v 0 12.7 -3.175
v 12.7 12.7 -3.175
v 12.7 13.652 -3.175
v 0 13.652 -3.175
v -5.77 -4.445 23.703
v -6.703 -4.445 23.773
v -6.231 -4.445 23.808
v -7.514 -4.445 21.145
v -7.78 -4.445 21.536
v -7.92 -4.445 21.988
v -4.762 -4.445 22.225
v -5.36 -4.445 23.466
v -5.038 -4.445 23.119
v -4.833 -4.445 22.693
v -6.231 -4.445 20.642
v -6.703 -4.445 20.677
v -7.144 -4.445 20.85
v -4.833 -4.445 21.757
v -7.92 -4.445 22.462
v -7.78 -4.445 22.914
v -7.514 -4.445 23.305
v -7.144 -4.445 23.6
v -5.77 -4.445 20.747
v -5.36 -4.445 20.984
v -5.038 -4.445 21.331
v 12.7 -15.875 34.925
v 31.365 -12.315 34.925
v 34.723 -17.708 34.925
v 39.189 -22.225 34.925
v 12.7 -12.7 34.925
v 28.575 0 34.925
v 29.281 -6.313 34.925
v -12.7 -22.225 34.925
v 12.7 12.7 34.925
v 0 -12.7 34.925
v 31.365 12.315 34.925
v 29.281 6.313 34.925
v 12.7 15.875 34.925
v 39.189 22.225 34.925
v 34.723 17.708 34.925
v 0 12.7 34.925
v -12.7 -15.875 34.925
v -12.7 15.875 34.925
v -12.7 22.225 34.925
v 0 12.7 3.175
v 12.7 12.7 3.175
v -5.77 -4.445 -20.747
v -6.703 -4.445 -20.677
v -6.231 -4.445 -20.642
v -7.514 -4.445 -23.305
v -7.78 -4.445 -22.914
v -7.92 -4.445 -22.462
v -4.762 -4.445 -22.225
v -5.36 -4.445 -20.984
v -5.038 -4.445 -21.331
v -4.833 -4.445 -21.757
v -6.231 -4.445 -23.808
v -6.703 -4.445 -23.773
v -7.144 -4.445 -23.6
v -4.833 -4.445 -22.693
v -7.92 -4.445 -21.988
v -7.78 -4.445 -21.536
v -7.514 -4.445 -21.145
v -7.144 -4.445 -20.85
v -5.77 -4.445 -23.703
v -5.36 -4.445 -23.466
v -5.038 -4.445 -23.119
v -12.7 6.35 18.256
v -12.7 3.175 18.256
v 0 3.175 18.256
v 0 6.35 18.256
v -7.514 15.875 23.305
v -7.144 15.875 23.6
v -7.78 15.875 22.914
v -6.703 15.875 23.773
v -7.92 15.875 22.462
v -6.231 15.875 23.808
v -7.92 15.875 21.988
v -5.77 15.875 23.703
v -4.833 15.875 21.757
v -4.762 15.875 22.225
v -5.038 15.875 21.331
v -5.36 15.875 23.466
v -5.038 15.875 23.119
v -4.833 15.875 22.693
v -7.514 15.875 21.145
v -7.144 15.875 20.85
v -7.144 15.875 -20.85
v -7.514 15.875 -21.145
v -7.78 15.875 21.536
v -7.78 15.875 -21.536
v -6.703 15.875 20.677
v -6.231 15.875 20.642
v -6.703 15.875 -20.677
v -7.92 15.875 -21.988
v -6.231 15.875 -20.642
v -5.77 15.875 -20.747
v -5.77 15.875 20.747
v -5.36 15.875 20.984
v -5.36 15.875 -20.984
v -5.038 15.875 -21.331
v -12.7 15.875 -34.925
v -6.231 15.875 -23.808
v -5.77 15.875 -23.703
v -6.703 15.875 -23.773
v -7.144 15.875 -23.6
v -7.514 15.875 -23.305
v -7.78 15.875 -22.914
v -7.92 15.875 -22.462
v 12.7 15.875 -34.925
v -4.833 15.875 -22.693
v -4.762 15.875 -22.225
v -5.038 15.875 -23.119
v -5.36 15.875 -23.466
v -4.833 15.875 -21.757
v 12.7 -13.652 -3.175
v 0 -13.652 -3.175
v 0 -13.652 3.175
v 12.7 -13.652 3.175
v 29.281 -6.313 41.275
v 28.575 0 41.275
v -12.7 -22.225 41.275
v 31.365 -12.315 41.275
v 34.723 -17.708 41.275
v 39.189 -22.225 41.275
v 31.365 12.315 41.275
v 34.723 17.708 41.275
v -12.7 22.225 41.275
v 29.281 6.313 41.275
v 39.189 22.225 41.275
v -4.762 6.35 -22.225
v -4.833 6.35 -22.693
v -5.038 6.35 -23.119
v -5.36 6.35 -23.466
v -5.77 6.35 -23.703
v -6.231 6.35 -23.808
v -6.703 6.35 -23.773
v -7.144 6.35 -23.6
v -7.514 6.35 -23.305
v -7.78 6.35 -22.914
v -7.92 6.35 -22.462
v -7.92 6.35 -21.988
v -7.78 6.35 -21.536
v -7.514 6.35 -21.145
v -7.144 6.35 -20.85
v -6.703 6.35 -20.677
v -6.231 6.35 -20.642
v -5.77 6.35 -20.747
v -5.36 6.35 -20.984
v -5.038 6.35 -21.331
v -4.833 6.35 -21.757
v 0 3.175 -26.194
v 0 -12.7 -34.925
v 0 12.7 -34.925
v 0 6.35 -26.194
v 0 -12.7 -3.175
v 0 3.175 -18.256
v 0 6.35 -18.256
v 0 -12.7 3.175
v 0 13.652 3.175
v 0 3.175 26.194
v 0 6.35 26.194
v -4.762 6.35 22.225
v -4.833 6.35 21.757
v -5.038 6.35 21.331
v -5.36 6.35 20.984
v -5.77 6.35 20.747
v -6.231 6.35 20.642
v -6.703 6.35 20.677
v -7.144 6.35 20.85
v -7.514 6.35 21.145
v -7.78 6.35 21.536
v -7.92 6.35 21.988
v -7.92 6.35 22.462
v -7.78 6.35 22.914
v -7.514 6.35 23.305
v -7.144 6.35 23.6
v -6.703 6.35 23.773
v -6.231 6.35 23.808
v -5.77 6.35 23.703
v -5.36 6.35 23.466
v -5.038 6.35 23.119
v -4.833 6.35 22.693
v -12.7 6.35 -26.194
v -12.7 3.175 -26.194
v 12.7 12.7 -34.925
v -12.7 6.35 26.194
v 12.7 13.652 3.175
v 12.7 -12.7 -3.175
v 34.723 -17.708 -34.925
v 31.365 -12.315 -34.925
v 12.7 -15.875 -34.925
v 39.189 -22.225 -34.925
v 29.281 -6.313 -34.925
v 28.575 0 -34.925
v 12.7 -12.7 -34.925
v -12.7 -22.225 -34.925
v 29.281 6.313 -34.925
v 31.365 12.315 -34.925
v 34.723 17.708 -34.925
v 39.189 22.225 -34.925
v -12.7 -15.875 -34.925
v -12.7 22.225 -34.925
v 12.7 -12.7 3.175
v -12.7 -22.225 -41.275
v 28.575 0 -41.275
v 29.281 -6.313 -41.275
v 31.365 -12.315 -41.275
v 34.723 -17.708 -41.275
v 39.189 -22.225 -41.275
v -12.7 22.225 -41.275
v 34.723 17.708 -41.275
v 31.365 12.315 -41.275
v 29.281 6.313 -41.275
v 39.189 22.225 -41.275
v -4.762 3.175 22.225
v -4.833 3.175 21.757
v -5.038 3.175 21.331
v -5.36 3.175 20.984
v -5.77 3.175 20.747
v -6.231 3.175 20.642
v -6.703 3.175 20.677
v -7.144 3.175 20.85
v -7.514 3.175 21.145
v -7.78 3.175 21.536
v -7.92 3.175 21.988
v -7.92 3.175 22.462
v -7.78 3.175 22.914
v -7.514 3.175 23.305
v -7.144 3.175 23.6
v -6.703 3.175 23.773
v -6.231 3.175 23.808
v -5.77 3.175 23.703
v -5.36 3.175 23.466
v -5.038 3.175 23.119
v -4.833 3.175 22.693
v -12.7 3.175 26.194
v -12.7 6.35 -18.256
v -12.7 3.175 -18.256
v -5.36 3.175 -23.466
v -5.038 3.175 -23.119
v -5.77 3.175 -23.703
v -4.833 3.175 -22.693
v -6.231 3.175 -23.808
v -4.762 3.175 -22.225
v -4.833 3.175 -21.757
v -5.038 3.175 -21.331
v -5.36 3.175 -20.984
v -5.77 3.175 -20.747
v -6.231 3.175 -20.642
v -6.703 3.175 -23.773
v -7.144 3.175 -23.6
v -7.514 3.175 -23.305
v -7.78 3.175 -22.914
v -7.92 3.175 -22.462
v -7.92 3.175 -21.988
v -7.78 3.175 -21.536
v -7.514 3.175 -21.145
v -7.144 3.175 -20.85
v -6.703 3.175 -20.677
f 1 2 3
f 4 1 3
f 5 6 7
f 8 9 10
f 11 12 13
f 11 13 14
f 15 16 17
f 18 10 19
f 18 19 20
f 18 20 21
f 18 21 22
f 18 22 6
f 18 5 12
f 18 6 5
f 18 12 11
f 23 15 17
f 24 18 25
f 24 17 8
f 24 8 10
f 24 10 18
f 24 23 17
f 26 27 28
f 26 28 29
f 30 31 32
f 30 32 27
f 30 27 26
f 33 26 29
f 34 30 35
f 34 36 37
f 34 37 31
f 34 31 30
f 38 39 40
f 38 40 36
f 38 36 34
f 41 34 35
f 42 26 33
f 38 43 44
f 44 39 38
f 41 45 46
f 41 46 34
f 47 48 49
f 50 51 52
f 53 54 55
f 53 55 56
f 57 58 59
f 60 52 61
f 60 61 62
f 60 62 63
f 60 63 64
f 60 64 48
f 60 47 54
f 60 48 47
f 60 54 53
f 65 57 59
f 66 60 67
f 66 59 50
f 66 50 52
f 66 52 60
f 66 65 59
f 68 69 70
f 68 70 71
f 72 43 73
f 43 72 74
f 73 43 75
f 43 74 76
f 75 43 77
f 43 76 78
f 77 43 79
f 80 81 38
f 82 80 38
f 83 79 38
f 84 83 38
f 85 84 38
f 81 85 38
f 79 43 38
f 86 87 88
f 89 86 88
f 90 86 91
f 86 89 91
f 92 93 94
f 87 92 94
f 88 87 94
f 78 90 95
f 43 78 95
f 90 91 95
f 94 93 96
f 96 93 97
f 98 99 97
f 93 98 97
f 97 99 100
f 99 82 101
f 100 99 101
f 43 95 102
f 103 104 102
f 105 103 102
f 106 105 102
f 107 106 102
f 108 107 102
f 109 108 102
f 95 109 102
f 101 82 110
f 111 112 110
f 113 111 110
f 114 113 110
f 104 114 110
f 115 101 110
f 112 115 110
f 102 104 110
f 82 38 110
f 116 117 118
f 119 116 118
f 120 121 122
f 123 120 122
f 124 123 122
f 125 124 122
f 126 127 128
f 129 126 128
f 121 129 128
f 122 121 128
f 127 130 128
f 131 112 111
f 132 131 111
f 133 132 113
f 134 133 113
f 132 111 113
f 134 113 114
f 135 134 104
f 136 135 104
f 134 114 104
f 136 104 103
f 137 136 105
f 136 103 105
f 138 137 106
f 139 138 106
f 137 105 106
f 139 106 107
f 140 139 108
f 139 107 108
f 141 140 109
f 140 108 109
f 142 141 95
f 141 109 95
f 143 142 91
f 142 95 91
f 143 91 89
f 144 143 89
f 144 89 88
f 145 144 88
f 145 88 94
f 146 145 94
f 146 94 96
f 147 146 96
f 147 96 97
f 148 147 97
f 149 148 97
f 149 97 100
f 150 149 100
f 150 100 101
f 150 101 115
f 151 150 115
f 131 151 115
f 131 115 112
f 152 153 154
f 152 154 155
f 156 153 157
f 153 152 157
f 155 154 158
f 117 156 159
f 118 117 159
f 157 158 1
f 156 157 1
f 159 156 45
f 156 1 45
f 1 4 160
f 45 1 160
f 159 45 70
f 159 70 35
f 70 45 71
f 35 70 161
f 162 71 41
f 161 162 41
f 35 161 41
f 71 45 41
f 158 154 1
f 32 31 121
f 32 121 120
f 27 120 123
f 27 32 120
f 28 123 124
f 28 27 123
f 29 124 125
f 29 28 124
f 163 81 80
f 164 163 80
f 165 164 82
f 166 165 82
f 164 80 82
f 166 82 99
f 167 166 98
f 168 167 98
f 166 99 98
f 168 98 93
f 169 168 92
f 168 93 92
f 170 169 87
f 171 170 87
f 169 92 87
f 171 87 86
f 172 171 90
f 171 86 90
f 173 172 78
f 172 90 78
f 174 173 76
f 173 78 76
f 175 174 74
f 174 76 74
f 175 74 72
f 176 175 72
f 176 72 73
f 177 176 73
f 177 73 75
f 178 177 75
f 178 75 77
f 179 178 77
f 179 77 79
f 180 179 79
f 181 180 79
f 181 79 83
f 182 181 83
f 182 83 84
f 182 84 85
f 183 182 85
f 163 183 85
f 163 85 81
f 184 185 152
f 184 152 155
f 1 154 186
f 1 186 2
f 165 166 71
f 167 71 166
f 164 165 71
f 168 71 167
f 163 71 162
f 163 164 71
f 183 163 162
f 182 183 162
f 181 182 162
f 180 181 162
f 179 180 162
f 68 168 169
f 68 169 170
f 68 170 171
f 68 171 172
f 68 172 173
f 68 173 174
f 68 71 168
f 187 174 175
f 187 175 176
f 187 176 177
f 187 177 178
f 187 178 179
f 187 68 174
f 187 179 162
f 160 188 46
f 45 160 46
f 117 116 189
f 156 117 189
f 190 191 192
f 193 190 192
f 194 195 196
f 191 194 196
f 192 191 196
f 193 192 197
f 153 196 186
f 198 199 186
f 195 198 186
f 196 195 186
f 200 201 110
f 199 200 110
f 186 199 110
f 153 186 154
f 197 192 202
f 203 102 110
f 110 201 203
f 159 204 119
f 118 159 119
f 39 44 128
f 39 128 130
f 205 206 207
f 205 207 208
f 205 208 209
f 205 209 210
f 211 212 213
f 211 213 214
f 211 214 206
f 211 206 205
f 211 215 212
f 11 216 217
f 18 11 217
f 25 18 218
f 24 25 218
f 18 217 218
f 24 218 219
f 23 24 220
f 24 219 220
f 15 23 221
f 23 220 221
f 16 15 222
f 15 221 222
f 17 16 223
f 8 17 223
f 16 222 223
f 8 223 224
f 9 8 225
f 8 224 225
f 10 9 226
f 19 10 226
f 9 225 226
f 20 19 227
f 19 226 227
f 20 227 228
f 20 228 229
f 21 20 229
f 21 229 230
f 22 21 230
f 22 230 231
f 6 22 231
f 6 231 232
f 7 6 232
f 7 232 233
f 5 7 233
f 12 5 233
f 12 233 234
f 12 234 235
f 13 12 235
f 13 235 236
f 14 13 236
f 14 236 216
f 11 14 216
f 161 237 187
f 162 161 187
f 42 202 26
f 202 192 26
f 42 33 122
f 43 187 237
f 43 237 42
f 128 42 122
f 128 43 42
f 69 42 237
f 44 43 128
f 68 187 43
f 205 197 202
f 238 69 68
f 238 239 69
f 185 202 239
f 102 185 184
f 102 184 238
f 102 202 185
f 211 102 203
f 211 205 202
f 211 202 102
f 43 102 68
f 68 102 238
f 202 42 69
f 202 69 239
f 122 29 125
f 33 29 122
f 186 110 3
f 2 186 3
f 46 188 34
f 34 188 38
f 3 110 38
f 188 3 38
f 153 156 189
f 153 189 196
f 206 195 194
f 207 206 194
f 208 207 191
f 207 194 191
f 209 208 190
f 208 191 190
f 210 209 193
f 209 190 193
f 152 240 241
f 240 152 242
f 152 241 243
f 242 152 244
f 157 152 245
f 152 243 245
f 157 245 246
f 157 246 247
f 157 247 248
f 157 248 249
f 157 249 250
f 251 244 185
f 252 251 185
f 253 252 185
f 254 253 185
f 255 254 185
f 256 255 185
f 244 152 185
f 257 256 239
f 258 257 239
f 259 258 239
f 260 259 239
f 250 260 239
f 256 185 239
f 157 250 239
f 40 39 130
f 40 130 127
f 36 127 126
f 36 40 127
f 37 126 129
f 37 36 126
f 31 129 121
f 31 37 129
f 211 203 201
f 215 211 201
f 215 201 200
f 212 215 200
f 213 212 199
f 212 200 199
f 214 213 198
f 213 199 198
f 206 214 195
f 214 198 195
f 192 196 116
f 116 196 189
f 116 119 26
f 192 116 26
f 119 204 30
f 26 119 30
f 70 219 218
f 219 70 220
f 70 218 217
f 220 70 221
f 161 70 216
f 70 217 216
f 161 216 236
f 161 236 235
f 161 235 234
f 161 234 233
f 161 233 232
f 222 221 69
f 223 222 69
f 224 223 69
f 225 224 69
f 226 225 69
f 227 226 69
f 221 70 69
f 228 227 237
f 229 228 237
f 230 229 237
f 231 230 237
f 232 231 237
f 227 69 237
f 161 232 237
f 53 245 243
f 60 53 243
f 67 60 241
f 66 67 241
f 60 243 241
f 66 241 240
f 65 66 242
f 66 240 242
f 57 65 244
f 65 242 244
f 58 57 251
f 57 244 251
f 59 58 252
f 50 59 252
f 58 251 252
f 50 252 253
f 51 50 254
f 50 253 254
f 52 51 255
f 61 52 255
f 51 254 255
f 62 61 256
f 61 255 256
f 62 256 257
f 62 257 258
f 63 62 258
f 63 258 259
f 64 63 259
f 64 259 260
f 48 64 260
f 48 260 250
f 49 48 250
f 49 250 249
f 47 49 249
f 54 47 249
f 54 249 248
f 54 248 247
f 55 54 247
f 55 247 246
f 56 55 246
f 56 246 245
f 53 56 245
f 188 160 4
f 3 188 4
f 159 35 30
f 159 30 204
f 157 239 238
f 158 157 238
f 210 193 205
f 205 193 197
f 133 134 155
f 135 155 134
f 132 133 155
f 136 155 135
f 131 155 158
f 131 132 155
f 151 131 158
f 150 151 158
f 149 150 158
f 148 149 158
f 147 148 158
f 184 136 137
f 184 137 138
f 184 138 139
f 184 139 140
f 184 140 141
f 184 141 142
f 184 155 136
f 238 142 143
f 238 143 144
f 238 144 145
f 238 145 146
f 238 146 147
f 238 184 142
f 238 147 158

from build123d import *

# Parameters (mm, degrees)
BOSS_EXTRUDE1_DEPTH   = 12.7
BOSS_EXTRUDE1_2_DEPTH = 12.7
SKETCH1_3_W           = 69.85
SKETCH1_3_H           = 31.75
BOSS_EXTRUDE2_DEPTH   = 12.7
BOSS_EXTRUDE3_DEPTH   = 6.35
SKETCH4_R             = 1.5875
CUT_EXTRUDE1_DEPTH    = 20.32
SKETCH5_W             = 7.9375
SKETCH5_H             = 3.175
CUT_EXTRUDE2_DEPTH    = 12.7


with BuildPart() as part:
    # Sketch1 → Boss-Extrude1 (new body)
    with BuildSketch(Plane(origin=(0, 0, 0), x_dir=(0, 0, -1), z_dir=(1, 0, 0))):
        Polygon((3.175, -13.6525), (-3.175, -13.6525), (-3.175, -12.7), (-34.925, -12.7), (-34.925, -15.875), (34.925, -15.875), (34.925, -12.7), (3.175, -12.7), align=None)
    extrude(amount=BOSS_EXTRUDE1_DEPTH)



with BuildPart() as body_2:
    # Sketch1 → Boss-Extrude1 2 (new body)
    with BuildSketch(Plane(origin=(0, 0, 0), x_dir=(0, 0, -1), z_dir=(1, 0, 0))):
        Polygon((-34.925, 15.875), (-34.925, 12.7), (-3.175, 12.7), (-3.175, 13.6525), (3.175, 13.6525), (3.175, 12.7), (34.925, 12.7), (34.925, 15.875), align=None)
    extrude(amount=BOSS_EXTRUDE1_2_DEPTH)


with BuildPart() as part_1:
    add(part.part)

    add(body_2.part)  # Boss-Extrude2 merges body 2
    # Sketch1<3> → Boss-Extrude2 (add)
    with BuildSketch(Plane(origin=(0, 0, 0), x_dir=(0, 0, -1), z_dir=(1, 0, 0))):
        Rectangle(SKETCH1_3_W, SKETCH1_3_H)
    extrude(amount=-BOSS_EXTRUDE2_DEPTH)

    # Sketch3 → Boss-Extrude3 (add)
    with BuildSketch(Plane(origin=(0, 0, -34.925), x_dir=(-1, 0, 0), z_dir=(0, 0, -1))):
        with BuildLine():
            Line((-39.189487758, -22.225), (12.7, -22.225))
            Line((12.7, -22.225), (12.7, 22.225))
            Line((12.7, 22.225), (-39.189487758, 22.225))
            ThreePointArc((-39.189487758, 22.225), (-28.575, 0), (-39.189487758, -22.225))
        make_face()
    boss_extrude3 = extrude(amount=BOSS_EXTRUDE3_DEPTH)

    # Mirror1: Boss-Extrude3 across plane
    add(boss_extrude3.mirror(Plane.XY))

    # Sketch4 → Cut-Extrude1 (cut)
    with BuildSketch(Plane(origin=(0, 15.875, 0), x_dir=(1, 0, 0), z_dir=(0, 1, 0))):
        with Locations((-6.35, 22.225)):
            Circle(SKETCH4_R)
        with Locations((-6.35, -22.225)):
            Circle(SKETCH4_R)
    extrude(amount=-CUT_EXTRUDE1_DEPTH, mode=Mode.SUBTRACT)

    # Sketch5 → Cut-Extrude2 (cut)
    with BuildSketch(Plane.ZY.offset(12.7)):
        with Locations((-22.225, 4.7625)):
            Rectangle(SKETCH5_W, SKETCH5_H)
        with Locations((22.225, 4.7625)):
            Rectangle(SKETCH5_W, SKETCH5_H)
    extrude(amount=-CUT_EXTRUDE2_DEPTH, mode=Mode.SUBTRACT)


solid = part_1.part
